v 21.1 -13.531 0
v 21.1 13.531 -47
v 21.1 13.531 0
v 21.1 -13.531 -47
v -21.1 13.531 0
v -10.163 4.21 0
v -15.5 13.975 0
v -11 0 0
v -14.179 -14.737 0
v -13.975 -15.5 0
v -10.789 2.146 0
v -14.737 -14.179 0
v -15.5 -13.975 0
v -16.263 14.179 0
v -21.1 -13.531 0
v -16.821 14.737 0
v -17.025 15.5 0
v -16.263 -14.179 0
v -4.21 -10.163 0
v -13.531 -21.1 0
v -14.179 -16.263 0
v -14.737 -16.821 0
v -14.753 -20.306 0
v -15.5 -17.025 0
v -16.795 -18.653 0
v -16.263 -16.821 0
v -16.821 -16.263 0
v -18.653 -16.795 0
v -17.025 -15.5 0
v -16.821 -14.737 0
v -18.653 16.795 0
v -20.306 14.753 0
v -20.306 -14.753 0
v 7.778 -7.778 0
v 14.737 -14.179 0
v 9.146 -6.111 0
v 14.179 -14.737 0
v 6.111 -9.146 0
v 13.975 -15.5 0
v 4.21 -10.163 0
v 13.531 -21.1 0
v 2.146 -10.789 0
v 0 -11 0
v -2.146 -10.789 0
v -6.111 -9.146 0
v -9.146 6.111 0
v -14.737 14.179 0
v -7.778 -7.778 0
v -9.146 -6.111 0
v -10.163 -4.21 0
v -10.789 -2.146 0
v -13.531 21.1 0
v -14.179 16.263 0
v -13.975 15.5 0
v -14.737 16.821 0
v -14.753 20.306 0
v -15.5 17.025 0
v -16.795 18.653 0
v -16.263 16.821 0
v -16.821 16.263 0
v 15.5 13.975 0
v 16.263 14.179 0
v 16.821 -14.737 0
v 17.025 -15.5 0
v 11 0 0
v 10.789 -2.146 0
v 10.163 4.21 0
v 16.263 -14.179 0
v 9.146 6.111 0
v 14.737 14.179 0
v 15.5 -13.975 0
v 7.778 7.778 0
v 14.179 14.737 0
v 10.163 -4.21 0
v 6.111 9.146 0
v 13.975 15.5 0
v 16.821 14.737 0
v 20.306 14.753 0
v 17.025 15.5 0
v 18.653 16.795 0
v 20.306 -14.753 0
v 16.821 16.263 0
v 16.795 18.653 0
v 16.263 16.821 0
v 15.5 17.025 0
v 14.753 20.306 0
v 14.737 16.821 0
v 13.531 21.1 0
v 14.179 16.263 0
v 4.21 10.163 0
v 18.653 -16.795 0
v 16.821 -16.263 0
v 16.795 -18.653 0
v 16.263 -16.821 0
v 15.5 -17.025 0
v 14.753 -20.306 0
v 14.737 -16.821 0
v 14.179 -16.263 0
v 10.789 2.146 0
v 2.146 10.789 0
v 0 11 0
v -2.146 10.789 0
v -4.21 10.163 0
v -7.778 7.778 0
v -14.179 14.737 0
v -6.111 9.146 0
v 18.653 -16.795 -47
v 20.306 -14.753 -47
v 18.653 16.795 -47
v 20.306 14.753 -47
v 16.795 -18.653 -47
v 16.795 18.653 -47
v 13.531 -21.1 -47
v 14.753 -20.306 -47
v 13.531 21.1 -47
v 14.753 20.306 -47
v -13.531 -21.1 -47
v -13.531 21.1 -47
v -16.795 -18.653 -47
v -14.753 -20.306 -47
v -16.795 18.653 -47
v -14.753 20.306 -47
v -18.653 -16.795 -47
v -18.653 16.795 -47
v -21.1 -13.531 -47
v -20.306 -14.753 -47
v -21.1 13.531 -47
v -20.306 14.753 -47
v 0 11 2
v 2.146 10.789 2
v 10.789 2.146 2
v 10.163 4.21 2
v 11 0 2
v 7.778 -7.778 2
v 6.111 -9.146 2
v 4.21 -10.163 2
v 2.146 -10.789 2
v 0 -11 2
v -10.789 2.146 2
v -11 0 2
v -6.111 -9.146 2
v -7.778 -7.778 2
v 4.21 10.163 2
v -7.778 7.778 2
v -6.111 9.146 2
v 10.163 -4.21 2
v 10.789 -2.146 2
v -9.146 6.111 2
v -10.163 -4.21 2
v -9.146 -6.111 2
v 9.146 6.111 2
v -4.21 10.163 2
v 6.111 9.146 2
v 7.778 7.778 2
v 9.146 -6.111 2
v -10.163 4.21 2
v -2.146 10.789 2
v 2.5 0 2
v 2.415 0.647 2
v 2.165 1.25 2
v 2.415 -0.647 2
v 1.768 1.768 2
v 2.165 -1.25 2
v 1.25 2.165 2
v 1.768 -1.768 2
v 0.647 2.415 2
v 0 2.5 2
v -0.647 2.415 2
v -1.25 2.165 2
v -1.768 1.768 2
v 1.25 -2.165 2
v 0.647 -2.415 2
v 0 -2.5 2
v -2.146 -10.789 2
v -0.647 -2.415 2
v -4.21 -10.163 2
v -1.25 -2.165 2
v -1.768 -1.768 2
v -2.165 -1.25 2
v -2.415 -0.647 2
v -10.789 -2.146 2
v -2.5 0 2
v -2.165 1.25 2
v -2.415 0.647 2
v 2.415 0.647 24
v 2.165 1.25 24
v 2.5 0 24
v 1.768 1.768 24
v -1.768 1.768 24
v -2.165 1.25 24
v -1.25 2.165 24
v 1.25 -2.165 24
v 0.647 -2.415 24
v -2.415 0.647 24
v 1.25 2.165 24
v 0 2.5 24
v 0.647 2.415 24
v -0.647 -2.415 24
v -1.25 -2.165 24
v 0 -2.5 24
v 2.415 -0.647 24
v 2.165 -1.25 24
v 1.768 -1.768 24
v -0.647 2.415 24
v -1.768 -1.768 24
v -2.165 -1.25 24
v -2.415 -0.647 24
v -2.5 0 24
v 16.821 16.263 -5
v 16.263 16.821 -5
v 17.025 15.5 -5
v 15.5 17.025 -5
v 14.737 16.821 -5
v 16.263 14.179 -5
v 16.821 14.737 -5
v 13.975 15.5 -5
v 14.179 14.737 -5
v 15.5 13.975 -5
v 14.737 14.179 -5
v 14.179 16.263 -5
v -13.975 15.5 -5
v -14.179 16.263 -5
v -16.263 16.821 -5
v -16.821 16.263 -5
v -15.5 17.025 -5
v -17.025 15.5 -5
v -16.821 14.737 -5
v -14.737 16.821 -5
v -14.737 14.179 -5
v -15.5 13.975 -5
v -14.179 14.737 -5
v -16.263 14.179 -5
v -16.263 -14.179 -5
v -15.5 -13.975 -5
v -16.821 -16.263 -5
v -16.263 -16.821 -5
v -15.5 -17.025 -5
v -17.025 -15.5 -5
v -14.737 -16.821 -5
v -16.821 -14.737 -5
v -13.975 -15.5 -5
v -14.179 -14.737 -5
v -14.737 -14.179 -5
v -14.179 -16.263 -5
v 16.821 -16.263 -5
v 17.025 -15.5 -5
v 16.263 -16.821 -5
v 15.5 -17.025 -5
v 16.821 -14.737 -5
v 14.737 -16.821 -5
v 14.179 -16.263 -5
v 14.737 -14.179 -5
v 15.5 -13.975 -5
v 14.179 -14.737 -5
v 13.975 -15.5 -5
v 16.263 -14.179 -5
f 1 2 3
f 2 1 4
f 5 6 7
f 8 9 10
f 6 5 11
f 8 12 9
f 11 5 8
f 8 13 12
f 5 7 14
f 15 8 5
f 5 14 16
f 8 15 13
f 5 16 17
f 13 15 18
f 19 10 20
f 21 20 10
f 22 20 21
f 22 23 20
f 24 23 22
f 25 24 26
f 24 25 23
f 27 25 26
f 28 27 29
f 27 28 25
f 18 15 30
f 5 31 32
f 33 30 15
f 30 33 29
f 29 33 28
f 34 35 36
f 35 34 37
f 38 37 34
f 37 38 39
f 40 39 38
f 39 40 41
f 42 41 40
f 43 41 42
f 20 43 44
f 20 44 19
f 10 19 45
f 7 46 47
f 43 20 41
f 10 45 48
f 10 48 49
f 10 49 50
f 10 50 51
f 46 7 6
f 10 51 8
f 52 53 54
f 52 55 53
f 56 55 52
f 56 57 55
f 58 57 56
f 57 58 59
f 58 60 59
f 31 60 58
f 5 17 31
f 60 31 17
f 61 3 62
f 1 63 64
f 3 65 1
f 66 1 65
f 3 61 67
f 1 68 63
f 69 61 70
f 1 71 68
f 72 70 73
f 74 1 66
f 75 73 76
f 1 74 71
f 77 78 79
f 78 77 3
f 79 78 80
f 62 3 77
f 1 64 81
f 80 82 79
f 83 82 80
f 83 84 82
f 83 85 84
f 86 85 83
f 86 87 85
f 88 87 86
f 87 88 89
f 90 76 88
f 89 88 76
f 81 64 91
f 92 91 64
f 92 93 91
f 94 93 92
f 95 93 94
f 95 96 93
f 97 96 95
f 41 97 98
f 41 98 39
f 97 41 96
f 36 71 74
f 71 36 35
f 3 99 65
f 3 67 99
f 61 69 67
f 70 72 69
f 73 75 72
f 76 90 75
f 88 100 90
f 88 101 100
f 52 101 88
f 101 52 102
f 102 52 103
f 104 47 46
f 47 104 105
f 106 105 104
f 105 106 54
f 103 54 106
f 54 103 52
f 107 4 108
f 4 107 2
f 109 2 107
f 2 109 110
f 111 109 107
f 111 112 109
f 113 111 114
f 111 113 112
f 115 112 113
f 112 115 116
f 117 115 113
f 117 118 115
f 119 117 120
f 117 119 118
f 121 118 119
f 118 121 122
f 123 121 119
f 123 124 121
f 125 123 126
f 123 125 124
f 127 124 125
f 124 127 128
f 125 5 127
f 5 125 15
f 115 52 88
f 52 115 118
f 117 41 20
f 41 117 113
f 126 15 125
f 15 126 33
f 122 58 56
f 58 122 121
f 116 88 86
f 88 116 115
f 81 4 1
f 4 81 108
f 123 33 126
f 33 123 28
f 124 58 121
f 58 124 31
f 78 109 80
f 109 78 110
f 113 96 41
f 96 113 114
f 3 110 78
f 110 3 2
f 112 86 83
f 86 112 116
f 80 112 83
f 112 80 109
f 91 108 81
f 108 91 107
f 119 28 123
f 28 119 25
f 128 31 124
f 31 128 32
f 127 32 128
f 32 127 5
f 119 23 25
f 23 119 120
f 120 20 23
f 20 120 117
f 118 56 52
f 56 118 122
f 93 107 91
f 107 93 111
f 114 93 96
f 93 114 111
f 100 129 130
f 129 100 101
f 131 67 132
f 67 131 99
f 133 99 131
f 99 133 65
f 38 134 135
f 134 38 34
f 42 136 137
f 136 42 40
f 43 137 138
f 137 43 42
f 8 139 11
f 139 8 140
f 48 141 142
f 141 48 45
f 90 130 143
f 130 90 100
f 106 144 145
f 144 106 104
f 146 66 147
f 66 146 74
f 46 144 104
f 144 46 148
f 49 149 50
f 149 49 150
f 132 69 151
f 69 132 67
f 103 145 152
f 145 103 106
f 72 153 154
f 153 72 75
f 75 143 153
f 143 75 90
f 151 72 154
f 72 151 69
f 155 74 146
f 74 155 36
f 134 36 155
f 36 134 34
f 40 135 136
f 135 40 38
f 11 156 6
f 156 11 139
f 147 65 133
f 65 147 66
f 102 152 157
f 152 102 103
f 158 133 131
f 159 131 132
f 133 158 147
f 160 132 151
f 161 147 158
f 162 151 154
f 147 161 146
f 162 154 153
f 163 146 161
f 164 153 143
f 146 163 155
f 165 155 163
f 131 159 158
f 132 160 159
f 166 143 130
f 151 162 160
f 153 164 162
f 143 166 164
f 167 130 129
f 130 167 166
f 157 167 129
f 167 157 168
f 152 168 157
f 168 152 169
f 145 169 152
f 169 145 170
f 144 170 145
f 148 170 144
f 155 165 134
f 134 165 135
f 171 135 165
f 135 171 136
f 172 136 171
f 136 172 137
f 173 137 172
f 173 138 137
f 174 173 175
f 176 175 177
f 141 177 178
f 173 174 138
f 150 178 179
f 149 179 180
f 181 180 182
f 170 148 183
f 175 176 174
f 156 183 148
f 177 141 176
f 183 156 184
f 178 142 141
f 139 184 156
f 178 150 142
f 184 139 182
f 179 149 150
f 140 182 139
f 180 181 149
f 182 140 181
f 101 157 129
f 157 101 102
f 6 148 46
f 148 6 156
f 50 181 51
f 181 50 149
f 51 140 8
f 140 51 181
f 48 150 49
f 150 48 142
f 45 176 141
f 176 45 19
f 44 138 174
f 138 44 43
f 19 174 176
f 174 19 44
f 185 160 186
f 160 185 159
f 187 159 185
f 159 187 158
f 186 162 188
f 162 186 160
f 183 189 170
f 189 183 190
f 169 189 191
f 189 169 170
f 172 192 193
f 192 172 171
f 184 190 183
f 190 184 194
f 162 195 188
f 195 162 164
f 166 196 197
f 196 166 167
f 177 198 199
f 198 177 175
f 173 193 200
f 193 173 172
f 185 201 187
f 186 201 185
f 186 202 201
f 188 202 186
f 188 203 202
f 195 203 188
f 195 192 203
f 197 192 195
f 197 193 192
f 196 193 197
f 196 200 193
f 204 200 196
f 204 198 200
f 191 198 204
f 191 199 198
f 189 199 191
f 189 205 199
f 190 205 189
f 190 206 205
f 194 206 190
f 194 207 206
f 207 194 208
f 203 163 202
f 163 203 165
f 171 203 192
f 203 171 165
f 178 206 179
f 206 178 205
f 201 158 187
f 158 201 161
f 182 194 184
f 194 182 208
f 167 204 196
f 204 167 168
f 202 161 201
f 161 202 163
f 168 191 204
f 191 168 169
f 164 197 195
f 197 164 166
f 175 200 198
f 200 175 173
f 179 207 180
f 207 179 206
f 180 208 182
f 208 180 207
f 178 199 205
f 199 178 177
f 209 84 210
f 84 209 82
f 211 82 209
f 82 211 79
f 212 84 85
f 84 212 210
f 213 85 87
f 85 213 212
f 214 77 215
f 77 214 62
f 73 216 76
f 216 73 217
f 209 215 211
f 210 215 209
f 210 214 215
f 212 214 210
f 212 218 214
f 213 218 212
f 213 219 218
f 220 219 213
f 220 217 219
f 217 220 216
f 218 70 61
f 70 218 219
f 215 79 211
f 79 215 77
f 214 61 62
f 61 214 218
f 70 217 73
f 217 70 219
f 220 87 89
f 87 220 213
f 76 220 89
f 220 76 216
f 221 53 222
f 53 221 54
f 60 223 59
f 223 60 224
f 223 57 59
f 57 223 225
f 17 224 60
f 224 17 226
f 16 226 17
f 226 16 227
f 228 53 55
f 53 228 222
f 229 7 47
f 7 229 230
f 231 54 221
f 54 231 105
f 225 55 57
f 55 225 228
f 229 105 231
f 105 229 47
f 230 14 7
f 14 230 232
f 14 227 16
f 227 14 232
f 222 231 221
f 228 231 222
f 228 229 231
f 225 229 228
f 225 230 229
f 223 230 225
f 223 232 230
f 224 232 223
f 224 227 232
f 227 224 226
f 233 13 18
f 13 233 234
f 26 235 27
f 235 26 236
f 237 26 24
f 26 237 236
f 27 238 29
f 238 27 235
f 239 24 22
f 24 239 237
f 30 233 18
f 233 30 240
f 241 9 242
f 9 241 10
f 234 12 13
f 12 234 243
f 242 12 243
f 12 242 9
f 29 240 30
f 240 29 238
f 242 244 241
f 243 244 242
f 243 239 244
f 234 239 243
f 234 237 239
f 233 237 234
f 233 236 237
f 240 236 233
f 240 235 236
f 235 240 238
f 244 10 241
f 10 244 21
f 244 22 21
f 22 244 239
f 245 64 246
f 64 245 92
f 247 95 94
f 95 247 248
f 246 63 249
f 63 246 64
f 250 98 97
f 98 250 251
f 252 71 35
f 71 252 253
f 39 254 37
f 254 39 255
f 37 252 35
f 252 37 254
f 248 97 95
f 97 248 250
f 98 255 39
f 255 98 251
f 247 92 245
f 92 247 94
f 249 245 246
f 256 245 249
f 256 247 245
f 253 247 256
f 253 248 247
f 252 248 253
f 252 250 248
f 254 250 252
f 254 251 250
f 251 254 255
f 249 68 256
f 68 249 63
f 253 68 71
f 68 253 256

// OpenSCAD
// file: configuration.scad
/**
 * @author Johann Rocholl <johann@rocholl.net>
 * @license GPL-3.0
 */

// Increase this if your slicer or printer make holes too tight.
extra_radius = 0.1;

// OD = outside diameter, corner to corner.
m3_nut_od = 6.1;
m3_nut_radius = m3_nut_od/2 + 0.2 + extra_radius;
m3_washer_radius = 3.5 + extra_radius;

// Major diameter of metric 3mm thread.
m3_major = 2.85;
m3_radius = m3_major/2 + extra_radius;
m3_wide_radius = m3_major/2 + extra_radius + 0.2;

// NEMA17 stepper motors.
motor_shaft_diameter = 5;
motor_shaft_radius = motor_shaft_diameter/2 + extra_radius;

// Frame brackets. M3x8mm screws work best with 3.6 mm brackets.
thickness = 3.6;

// OpenBeam or Misumi. Currently only 15x15 mm, but there is a plan
// to make models more parametric and allow 20x20 mm in the future.
extrusion = 15;

// Placement for the NEMA17 stepper motors.
motor_offset = 44;
motor_length = 47;
// main file
/**
 * @author Johann Rocholl <johann@rocholl.net>
 * @license GPL-3.0
 */

include <configuration.scad>;

module nema17() {
  // NEMA 17 stepper motor.
  difference() {
    union() {
      translate([0, 0, -motor_length/2]) intersection() {
        cube([42.2, 42.2, motor_length], center=true);
        cylinder(r=25.1, h=motor_length+1, center=true, $fn=60);
      }
      cylinder(r=11, h=4, center=true, $fn=32);
      cylinder(r=2.5, h=48, center=true, $fn=24);
    }
    for (a = [0:90:359]) {
      rotate([0, 0, a]) translate([15.5, 15.5, 0])
        cylinder(r=m3_radius, h=10, center=true, $fn=12);
    }
  }
}

nema17();
